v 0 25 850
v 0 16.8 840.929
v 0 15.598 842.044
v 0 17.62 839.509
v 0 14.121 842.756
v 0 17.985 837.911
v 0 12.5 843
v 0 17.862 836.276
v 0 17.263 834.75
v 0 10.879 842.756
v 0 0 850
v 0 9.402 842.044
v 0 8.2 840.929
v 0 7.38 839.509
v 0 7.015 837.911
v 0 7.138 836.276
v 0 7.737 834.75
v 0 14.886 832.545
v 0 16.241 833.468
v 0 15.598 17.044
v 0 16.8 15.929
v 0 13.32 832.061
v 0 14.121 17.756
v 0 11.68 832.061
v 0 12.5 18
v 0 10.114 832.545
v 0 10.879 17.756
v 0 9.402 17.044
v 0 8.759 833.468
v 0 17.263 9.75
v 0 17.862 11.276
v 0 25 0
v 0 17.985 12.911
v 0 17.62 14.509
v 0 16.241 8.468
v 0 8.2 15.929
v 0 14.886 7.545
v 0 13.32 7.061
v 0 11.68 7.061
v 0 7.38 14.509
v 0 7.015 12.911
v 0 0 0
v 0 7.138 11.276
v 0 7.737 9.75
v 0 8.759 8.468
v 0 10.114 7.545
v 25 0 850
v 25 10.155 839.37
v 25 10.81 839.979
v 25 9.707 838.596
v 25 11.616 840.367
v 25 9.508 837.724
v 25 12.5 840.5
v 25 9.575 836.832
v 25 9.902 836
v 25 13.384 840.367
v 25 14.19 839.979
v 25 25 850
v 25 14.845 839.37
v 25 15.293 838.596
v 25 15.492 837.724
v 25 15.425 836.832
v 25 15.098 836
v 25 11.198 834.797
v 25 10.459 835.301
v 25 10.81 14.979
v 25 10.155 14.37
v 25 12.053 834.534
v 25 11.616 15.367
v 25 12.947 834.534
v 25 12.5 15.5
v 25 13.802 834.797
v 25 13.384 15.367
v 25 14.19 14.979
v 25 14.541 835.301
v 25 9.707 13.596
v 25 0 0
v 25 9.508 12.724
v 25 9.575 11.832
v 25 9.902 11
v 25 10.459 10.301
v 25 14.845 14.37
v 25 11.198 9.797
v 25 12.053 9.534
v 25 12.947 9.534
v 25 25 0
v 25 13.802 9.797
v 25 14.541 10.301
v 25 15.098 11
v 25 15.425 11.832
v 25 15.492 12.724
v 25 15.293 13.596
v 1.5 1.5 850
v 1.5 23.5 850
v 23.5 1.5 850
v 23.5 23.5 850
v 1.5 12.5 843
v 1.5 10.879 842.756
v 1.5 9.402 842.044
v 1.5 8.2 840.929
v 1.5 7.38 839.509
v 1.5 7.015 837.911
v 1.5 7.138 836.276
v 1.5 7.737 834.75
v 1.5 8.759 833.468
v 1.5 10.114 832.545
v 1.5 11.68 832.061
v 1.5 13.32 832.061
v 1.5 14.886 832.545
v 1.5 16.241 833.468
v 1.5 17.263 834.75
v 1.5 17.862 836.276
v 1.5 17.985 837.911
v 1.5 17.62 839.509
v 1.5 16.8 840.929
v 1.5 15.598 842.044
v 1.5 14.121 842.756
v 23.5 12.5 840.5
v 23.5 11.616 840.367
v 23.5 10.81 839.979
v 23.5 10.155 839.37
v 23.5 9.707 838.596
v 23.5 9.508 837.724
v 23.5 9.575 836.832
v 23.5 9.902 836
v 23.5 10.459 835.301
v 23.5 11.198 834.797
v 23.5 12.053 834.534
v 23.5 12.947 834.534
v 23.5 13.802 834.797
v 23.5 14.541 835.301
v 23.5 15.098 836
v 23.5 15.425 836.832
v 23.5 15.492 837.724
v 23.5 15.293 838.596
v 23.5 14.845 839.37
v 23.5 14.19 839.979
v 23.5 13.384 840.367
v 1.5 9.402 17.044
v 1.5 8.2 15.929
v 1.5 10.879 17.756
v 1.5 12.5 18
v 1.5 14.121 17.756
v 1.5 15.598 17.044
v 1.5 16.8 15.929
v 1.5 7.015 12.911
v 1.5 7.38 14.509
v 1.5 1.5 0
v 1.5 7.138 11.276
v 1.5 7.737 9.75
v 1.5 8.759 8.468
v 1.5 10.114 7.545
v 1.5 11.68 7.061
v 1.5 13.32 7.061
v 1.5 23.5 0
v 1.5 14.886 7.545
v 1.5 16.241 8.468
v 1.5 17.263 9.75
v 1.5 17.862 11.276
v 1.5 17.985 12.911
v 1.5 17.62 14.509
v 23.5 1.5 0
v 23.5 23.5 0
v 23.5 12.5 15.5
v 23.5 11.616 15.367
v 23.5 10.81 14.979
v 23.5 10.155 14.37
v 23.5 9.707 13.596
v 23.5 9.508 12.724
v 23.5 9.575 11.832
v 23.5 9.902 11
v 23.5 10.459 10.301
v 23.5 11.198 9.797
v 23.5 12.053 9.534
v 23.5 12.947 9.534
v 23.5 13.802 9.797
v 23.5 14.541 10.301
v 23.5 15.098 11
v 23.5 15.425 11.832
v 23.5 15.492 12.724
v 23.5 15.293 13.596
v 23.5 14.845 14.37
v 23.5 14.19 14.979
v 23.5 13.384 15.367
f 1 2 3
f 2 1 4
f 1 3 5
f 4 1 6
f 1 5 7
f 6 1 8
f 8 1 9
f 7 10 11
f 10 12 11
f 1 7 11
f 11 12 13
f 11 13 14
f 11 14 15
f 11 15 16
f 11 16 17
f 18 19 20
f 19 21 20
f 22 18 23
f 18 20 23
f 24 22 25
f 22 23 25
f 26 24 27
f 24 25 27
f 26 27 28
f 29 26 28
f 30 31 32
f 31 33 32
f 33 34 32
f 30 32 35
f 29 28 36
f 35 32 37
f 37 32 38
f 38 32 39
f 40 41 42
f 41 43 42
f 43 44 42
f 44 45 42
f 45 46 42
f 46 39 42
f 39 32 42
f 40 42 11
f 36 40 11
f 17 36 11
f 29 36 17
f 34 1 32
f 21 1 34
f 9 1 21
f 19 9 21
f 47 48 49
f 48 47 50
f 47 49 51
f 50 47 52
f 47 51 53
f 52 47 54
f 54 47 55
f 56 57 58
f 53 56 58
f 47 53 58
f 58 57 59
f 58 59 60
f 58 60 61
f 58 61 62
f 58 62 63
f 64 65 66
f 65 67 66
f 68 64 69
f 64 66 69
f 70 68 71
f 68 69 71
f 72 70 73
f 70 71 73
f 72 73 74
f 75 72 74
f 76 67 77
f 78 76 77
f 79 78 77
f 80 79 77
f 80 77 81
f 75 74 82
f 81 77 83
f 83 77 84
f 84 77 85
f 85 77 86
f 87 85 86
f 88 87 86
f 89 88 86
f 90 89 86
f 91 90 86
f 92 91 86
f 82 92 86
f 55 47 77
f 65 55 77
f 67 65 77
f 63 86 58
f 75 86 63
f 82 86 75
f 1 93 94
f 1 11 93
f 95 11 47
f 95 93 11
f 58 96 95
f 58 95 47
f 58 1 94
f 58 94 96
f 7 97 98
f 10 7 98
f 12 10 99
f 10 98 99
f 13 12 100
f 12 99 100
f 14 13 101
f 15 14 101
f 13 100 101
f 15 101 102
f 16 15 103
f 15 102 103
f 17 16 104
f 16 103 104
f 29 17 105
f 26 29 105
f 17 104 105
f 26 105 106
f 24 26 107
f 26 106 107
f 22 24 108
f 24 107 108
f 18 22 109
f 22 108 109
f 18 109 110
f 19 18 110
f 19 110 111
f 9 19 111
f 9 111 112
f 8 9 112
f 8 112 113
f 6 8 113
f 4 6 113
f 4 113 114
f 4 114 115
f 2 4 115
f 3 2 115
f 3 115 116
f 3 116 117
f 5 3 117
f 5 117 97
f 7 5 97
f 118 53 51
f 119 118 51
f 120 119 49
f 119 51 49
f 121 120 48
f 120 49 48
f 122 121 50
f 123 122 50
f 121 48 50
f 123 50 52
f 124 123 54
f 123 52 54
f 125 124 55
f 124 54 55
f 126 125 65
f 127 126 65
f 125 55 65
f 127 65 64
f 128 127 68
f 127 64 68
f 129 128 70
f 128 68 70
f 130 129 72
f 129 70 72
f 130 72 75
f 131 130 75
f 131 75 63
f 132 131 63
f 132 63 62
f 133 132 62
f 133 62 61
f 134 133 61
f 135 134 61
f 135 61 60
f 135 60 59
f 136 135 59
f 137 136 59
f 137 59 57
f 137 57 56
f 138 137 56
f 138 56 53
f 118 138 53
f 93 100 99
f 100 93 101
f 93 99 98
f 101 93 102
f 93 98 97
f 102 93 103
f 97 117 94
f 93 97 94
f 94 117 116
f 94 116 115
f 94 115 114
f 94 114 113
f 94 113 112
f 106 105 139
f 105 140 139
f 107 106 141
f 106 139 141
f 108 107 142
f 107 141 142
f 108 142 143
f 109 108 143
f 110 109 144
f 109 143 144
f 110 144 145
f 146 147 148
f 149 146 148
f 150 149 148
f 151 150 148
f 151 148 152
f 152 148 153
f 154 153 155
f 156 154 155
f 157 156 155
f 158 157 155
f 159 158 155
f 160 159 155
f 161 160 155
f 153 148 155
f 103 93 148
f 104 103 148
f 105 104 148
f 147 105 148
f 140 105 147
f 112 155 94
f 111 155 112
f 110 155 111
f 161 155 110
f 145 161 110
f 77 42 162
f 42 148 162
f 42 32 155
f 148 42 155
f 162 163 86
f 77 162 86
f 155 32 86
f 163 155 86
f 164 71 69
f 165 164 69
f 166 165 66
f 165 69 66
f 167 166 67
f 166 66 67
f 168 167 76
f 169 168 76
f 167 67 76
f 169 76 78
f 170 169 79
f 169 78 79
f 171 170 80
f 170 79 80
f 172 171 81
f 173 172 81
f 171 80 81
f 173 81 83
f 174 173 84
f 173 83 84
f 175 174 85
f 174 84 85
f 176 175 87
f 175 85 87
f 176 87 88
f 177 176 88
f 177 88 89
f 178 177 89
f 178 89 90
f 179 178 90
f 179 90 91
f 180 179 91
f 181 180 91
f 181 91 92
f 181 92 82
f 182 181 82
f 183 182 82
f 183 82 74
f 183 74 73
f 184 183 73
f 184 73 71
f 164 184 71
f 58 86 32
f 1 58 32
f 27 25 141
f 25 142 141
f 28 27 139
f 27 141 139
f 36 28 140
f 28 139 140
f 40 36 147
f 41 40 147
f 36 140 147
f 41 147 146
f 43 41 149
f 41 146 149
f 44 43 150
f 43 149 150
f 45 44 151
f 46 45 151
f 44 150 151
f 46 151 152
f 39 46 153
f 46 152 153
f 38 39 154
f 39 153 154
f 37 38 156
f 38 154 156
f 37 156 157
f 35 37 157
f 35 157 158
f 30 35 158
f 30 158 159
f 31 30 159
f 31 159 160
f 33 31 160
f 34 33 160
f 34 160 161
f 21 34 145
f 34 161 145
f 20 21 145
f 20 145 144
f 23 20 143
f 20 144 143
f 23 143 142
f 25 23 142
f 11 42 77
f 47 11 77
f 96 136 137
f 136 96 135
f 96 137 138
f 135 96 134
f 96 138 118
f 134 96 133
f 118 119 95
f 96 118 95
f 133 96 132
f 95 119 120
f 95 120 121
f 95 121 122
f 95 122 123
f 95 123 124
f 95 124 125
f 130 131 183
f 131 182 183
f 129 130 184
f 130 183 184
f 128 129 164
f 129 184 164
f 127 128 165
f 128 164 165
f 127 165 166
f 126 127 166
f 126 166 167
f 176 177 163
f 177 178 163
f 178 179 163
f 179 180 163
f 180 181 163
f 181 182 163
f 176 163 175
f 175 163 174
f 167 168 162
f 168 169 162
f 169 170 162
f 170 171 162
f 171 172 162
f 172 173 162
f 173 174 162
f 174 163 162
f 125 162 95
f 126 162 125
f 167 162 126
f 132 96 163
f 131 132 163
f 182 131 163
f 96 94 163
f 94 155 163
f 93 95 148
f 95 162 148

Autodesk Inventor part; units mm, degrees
ref_plane "YZ Plane" through (0, 0, 0) normal (1, 0, 0) x (0, 1, 0)
ref_plane "XZ Plane" through (0, 0, 0) normal (0, 1, 0) x (-1, 0, 0)
ref_plane "XY Plane" through (0, 0, 0) normal (0, 0, 1) x (1, 0, 0)
sketch "Sketch1" plane through (0, 0, 0) normal (0, 0, 1) x (1, 0, 0)
  line L0 (0, 0) -> (25, 0)
  line L1 (25, 0) -> (25, 25)
  line L2 (25, 25) -> (0, 25)
  line L3 (0, 25) -> (0, 0)
  line L4 (23.5, 23.5) -> (23.5, 1.5)
  line L5 (23.5, 1.5) -> (1.5, 1.5)
  line L6 (1.5, 1.5) -> (1.5, 23.5)
  line L7 (1.5, 23.5) -> (23.5, 23.5)
  dimension "d0" = 25
  dimension "d1" = 25
  dimension "d2" = 1.5
extrude "Extrusion1" add sketch "Sketch1" along normal blind 850
sketch "Sketch2" plane through (0, 0, 0) normal (1, 0, 0) x (0, 0, -1)
  line L0 (0, 0) -> (0, 25) projected
  line L1 (-850, 0) -> (-850, 25) projected
  point P0 (-837.5, 12.5)
  point P1 (-12.5, 12.5)
  dimension "d5" = 12.5
  dimension "d6" = 12.5
  dimension "d7" = 12.5
hole "Hole1" at (0, 12.5, 837.5) at (0, 12.5, 12.5) direction (1, 0, 0) diameter 6 end through all counterbore diameter 11 counterbore depth 5
equation "\"d6\" = d5"
properties part number "Side Bar"
